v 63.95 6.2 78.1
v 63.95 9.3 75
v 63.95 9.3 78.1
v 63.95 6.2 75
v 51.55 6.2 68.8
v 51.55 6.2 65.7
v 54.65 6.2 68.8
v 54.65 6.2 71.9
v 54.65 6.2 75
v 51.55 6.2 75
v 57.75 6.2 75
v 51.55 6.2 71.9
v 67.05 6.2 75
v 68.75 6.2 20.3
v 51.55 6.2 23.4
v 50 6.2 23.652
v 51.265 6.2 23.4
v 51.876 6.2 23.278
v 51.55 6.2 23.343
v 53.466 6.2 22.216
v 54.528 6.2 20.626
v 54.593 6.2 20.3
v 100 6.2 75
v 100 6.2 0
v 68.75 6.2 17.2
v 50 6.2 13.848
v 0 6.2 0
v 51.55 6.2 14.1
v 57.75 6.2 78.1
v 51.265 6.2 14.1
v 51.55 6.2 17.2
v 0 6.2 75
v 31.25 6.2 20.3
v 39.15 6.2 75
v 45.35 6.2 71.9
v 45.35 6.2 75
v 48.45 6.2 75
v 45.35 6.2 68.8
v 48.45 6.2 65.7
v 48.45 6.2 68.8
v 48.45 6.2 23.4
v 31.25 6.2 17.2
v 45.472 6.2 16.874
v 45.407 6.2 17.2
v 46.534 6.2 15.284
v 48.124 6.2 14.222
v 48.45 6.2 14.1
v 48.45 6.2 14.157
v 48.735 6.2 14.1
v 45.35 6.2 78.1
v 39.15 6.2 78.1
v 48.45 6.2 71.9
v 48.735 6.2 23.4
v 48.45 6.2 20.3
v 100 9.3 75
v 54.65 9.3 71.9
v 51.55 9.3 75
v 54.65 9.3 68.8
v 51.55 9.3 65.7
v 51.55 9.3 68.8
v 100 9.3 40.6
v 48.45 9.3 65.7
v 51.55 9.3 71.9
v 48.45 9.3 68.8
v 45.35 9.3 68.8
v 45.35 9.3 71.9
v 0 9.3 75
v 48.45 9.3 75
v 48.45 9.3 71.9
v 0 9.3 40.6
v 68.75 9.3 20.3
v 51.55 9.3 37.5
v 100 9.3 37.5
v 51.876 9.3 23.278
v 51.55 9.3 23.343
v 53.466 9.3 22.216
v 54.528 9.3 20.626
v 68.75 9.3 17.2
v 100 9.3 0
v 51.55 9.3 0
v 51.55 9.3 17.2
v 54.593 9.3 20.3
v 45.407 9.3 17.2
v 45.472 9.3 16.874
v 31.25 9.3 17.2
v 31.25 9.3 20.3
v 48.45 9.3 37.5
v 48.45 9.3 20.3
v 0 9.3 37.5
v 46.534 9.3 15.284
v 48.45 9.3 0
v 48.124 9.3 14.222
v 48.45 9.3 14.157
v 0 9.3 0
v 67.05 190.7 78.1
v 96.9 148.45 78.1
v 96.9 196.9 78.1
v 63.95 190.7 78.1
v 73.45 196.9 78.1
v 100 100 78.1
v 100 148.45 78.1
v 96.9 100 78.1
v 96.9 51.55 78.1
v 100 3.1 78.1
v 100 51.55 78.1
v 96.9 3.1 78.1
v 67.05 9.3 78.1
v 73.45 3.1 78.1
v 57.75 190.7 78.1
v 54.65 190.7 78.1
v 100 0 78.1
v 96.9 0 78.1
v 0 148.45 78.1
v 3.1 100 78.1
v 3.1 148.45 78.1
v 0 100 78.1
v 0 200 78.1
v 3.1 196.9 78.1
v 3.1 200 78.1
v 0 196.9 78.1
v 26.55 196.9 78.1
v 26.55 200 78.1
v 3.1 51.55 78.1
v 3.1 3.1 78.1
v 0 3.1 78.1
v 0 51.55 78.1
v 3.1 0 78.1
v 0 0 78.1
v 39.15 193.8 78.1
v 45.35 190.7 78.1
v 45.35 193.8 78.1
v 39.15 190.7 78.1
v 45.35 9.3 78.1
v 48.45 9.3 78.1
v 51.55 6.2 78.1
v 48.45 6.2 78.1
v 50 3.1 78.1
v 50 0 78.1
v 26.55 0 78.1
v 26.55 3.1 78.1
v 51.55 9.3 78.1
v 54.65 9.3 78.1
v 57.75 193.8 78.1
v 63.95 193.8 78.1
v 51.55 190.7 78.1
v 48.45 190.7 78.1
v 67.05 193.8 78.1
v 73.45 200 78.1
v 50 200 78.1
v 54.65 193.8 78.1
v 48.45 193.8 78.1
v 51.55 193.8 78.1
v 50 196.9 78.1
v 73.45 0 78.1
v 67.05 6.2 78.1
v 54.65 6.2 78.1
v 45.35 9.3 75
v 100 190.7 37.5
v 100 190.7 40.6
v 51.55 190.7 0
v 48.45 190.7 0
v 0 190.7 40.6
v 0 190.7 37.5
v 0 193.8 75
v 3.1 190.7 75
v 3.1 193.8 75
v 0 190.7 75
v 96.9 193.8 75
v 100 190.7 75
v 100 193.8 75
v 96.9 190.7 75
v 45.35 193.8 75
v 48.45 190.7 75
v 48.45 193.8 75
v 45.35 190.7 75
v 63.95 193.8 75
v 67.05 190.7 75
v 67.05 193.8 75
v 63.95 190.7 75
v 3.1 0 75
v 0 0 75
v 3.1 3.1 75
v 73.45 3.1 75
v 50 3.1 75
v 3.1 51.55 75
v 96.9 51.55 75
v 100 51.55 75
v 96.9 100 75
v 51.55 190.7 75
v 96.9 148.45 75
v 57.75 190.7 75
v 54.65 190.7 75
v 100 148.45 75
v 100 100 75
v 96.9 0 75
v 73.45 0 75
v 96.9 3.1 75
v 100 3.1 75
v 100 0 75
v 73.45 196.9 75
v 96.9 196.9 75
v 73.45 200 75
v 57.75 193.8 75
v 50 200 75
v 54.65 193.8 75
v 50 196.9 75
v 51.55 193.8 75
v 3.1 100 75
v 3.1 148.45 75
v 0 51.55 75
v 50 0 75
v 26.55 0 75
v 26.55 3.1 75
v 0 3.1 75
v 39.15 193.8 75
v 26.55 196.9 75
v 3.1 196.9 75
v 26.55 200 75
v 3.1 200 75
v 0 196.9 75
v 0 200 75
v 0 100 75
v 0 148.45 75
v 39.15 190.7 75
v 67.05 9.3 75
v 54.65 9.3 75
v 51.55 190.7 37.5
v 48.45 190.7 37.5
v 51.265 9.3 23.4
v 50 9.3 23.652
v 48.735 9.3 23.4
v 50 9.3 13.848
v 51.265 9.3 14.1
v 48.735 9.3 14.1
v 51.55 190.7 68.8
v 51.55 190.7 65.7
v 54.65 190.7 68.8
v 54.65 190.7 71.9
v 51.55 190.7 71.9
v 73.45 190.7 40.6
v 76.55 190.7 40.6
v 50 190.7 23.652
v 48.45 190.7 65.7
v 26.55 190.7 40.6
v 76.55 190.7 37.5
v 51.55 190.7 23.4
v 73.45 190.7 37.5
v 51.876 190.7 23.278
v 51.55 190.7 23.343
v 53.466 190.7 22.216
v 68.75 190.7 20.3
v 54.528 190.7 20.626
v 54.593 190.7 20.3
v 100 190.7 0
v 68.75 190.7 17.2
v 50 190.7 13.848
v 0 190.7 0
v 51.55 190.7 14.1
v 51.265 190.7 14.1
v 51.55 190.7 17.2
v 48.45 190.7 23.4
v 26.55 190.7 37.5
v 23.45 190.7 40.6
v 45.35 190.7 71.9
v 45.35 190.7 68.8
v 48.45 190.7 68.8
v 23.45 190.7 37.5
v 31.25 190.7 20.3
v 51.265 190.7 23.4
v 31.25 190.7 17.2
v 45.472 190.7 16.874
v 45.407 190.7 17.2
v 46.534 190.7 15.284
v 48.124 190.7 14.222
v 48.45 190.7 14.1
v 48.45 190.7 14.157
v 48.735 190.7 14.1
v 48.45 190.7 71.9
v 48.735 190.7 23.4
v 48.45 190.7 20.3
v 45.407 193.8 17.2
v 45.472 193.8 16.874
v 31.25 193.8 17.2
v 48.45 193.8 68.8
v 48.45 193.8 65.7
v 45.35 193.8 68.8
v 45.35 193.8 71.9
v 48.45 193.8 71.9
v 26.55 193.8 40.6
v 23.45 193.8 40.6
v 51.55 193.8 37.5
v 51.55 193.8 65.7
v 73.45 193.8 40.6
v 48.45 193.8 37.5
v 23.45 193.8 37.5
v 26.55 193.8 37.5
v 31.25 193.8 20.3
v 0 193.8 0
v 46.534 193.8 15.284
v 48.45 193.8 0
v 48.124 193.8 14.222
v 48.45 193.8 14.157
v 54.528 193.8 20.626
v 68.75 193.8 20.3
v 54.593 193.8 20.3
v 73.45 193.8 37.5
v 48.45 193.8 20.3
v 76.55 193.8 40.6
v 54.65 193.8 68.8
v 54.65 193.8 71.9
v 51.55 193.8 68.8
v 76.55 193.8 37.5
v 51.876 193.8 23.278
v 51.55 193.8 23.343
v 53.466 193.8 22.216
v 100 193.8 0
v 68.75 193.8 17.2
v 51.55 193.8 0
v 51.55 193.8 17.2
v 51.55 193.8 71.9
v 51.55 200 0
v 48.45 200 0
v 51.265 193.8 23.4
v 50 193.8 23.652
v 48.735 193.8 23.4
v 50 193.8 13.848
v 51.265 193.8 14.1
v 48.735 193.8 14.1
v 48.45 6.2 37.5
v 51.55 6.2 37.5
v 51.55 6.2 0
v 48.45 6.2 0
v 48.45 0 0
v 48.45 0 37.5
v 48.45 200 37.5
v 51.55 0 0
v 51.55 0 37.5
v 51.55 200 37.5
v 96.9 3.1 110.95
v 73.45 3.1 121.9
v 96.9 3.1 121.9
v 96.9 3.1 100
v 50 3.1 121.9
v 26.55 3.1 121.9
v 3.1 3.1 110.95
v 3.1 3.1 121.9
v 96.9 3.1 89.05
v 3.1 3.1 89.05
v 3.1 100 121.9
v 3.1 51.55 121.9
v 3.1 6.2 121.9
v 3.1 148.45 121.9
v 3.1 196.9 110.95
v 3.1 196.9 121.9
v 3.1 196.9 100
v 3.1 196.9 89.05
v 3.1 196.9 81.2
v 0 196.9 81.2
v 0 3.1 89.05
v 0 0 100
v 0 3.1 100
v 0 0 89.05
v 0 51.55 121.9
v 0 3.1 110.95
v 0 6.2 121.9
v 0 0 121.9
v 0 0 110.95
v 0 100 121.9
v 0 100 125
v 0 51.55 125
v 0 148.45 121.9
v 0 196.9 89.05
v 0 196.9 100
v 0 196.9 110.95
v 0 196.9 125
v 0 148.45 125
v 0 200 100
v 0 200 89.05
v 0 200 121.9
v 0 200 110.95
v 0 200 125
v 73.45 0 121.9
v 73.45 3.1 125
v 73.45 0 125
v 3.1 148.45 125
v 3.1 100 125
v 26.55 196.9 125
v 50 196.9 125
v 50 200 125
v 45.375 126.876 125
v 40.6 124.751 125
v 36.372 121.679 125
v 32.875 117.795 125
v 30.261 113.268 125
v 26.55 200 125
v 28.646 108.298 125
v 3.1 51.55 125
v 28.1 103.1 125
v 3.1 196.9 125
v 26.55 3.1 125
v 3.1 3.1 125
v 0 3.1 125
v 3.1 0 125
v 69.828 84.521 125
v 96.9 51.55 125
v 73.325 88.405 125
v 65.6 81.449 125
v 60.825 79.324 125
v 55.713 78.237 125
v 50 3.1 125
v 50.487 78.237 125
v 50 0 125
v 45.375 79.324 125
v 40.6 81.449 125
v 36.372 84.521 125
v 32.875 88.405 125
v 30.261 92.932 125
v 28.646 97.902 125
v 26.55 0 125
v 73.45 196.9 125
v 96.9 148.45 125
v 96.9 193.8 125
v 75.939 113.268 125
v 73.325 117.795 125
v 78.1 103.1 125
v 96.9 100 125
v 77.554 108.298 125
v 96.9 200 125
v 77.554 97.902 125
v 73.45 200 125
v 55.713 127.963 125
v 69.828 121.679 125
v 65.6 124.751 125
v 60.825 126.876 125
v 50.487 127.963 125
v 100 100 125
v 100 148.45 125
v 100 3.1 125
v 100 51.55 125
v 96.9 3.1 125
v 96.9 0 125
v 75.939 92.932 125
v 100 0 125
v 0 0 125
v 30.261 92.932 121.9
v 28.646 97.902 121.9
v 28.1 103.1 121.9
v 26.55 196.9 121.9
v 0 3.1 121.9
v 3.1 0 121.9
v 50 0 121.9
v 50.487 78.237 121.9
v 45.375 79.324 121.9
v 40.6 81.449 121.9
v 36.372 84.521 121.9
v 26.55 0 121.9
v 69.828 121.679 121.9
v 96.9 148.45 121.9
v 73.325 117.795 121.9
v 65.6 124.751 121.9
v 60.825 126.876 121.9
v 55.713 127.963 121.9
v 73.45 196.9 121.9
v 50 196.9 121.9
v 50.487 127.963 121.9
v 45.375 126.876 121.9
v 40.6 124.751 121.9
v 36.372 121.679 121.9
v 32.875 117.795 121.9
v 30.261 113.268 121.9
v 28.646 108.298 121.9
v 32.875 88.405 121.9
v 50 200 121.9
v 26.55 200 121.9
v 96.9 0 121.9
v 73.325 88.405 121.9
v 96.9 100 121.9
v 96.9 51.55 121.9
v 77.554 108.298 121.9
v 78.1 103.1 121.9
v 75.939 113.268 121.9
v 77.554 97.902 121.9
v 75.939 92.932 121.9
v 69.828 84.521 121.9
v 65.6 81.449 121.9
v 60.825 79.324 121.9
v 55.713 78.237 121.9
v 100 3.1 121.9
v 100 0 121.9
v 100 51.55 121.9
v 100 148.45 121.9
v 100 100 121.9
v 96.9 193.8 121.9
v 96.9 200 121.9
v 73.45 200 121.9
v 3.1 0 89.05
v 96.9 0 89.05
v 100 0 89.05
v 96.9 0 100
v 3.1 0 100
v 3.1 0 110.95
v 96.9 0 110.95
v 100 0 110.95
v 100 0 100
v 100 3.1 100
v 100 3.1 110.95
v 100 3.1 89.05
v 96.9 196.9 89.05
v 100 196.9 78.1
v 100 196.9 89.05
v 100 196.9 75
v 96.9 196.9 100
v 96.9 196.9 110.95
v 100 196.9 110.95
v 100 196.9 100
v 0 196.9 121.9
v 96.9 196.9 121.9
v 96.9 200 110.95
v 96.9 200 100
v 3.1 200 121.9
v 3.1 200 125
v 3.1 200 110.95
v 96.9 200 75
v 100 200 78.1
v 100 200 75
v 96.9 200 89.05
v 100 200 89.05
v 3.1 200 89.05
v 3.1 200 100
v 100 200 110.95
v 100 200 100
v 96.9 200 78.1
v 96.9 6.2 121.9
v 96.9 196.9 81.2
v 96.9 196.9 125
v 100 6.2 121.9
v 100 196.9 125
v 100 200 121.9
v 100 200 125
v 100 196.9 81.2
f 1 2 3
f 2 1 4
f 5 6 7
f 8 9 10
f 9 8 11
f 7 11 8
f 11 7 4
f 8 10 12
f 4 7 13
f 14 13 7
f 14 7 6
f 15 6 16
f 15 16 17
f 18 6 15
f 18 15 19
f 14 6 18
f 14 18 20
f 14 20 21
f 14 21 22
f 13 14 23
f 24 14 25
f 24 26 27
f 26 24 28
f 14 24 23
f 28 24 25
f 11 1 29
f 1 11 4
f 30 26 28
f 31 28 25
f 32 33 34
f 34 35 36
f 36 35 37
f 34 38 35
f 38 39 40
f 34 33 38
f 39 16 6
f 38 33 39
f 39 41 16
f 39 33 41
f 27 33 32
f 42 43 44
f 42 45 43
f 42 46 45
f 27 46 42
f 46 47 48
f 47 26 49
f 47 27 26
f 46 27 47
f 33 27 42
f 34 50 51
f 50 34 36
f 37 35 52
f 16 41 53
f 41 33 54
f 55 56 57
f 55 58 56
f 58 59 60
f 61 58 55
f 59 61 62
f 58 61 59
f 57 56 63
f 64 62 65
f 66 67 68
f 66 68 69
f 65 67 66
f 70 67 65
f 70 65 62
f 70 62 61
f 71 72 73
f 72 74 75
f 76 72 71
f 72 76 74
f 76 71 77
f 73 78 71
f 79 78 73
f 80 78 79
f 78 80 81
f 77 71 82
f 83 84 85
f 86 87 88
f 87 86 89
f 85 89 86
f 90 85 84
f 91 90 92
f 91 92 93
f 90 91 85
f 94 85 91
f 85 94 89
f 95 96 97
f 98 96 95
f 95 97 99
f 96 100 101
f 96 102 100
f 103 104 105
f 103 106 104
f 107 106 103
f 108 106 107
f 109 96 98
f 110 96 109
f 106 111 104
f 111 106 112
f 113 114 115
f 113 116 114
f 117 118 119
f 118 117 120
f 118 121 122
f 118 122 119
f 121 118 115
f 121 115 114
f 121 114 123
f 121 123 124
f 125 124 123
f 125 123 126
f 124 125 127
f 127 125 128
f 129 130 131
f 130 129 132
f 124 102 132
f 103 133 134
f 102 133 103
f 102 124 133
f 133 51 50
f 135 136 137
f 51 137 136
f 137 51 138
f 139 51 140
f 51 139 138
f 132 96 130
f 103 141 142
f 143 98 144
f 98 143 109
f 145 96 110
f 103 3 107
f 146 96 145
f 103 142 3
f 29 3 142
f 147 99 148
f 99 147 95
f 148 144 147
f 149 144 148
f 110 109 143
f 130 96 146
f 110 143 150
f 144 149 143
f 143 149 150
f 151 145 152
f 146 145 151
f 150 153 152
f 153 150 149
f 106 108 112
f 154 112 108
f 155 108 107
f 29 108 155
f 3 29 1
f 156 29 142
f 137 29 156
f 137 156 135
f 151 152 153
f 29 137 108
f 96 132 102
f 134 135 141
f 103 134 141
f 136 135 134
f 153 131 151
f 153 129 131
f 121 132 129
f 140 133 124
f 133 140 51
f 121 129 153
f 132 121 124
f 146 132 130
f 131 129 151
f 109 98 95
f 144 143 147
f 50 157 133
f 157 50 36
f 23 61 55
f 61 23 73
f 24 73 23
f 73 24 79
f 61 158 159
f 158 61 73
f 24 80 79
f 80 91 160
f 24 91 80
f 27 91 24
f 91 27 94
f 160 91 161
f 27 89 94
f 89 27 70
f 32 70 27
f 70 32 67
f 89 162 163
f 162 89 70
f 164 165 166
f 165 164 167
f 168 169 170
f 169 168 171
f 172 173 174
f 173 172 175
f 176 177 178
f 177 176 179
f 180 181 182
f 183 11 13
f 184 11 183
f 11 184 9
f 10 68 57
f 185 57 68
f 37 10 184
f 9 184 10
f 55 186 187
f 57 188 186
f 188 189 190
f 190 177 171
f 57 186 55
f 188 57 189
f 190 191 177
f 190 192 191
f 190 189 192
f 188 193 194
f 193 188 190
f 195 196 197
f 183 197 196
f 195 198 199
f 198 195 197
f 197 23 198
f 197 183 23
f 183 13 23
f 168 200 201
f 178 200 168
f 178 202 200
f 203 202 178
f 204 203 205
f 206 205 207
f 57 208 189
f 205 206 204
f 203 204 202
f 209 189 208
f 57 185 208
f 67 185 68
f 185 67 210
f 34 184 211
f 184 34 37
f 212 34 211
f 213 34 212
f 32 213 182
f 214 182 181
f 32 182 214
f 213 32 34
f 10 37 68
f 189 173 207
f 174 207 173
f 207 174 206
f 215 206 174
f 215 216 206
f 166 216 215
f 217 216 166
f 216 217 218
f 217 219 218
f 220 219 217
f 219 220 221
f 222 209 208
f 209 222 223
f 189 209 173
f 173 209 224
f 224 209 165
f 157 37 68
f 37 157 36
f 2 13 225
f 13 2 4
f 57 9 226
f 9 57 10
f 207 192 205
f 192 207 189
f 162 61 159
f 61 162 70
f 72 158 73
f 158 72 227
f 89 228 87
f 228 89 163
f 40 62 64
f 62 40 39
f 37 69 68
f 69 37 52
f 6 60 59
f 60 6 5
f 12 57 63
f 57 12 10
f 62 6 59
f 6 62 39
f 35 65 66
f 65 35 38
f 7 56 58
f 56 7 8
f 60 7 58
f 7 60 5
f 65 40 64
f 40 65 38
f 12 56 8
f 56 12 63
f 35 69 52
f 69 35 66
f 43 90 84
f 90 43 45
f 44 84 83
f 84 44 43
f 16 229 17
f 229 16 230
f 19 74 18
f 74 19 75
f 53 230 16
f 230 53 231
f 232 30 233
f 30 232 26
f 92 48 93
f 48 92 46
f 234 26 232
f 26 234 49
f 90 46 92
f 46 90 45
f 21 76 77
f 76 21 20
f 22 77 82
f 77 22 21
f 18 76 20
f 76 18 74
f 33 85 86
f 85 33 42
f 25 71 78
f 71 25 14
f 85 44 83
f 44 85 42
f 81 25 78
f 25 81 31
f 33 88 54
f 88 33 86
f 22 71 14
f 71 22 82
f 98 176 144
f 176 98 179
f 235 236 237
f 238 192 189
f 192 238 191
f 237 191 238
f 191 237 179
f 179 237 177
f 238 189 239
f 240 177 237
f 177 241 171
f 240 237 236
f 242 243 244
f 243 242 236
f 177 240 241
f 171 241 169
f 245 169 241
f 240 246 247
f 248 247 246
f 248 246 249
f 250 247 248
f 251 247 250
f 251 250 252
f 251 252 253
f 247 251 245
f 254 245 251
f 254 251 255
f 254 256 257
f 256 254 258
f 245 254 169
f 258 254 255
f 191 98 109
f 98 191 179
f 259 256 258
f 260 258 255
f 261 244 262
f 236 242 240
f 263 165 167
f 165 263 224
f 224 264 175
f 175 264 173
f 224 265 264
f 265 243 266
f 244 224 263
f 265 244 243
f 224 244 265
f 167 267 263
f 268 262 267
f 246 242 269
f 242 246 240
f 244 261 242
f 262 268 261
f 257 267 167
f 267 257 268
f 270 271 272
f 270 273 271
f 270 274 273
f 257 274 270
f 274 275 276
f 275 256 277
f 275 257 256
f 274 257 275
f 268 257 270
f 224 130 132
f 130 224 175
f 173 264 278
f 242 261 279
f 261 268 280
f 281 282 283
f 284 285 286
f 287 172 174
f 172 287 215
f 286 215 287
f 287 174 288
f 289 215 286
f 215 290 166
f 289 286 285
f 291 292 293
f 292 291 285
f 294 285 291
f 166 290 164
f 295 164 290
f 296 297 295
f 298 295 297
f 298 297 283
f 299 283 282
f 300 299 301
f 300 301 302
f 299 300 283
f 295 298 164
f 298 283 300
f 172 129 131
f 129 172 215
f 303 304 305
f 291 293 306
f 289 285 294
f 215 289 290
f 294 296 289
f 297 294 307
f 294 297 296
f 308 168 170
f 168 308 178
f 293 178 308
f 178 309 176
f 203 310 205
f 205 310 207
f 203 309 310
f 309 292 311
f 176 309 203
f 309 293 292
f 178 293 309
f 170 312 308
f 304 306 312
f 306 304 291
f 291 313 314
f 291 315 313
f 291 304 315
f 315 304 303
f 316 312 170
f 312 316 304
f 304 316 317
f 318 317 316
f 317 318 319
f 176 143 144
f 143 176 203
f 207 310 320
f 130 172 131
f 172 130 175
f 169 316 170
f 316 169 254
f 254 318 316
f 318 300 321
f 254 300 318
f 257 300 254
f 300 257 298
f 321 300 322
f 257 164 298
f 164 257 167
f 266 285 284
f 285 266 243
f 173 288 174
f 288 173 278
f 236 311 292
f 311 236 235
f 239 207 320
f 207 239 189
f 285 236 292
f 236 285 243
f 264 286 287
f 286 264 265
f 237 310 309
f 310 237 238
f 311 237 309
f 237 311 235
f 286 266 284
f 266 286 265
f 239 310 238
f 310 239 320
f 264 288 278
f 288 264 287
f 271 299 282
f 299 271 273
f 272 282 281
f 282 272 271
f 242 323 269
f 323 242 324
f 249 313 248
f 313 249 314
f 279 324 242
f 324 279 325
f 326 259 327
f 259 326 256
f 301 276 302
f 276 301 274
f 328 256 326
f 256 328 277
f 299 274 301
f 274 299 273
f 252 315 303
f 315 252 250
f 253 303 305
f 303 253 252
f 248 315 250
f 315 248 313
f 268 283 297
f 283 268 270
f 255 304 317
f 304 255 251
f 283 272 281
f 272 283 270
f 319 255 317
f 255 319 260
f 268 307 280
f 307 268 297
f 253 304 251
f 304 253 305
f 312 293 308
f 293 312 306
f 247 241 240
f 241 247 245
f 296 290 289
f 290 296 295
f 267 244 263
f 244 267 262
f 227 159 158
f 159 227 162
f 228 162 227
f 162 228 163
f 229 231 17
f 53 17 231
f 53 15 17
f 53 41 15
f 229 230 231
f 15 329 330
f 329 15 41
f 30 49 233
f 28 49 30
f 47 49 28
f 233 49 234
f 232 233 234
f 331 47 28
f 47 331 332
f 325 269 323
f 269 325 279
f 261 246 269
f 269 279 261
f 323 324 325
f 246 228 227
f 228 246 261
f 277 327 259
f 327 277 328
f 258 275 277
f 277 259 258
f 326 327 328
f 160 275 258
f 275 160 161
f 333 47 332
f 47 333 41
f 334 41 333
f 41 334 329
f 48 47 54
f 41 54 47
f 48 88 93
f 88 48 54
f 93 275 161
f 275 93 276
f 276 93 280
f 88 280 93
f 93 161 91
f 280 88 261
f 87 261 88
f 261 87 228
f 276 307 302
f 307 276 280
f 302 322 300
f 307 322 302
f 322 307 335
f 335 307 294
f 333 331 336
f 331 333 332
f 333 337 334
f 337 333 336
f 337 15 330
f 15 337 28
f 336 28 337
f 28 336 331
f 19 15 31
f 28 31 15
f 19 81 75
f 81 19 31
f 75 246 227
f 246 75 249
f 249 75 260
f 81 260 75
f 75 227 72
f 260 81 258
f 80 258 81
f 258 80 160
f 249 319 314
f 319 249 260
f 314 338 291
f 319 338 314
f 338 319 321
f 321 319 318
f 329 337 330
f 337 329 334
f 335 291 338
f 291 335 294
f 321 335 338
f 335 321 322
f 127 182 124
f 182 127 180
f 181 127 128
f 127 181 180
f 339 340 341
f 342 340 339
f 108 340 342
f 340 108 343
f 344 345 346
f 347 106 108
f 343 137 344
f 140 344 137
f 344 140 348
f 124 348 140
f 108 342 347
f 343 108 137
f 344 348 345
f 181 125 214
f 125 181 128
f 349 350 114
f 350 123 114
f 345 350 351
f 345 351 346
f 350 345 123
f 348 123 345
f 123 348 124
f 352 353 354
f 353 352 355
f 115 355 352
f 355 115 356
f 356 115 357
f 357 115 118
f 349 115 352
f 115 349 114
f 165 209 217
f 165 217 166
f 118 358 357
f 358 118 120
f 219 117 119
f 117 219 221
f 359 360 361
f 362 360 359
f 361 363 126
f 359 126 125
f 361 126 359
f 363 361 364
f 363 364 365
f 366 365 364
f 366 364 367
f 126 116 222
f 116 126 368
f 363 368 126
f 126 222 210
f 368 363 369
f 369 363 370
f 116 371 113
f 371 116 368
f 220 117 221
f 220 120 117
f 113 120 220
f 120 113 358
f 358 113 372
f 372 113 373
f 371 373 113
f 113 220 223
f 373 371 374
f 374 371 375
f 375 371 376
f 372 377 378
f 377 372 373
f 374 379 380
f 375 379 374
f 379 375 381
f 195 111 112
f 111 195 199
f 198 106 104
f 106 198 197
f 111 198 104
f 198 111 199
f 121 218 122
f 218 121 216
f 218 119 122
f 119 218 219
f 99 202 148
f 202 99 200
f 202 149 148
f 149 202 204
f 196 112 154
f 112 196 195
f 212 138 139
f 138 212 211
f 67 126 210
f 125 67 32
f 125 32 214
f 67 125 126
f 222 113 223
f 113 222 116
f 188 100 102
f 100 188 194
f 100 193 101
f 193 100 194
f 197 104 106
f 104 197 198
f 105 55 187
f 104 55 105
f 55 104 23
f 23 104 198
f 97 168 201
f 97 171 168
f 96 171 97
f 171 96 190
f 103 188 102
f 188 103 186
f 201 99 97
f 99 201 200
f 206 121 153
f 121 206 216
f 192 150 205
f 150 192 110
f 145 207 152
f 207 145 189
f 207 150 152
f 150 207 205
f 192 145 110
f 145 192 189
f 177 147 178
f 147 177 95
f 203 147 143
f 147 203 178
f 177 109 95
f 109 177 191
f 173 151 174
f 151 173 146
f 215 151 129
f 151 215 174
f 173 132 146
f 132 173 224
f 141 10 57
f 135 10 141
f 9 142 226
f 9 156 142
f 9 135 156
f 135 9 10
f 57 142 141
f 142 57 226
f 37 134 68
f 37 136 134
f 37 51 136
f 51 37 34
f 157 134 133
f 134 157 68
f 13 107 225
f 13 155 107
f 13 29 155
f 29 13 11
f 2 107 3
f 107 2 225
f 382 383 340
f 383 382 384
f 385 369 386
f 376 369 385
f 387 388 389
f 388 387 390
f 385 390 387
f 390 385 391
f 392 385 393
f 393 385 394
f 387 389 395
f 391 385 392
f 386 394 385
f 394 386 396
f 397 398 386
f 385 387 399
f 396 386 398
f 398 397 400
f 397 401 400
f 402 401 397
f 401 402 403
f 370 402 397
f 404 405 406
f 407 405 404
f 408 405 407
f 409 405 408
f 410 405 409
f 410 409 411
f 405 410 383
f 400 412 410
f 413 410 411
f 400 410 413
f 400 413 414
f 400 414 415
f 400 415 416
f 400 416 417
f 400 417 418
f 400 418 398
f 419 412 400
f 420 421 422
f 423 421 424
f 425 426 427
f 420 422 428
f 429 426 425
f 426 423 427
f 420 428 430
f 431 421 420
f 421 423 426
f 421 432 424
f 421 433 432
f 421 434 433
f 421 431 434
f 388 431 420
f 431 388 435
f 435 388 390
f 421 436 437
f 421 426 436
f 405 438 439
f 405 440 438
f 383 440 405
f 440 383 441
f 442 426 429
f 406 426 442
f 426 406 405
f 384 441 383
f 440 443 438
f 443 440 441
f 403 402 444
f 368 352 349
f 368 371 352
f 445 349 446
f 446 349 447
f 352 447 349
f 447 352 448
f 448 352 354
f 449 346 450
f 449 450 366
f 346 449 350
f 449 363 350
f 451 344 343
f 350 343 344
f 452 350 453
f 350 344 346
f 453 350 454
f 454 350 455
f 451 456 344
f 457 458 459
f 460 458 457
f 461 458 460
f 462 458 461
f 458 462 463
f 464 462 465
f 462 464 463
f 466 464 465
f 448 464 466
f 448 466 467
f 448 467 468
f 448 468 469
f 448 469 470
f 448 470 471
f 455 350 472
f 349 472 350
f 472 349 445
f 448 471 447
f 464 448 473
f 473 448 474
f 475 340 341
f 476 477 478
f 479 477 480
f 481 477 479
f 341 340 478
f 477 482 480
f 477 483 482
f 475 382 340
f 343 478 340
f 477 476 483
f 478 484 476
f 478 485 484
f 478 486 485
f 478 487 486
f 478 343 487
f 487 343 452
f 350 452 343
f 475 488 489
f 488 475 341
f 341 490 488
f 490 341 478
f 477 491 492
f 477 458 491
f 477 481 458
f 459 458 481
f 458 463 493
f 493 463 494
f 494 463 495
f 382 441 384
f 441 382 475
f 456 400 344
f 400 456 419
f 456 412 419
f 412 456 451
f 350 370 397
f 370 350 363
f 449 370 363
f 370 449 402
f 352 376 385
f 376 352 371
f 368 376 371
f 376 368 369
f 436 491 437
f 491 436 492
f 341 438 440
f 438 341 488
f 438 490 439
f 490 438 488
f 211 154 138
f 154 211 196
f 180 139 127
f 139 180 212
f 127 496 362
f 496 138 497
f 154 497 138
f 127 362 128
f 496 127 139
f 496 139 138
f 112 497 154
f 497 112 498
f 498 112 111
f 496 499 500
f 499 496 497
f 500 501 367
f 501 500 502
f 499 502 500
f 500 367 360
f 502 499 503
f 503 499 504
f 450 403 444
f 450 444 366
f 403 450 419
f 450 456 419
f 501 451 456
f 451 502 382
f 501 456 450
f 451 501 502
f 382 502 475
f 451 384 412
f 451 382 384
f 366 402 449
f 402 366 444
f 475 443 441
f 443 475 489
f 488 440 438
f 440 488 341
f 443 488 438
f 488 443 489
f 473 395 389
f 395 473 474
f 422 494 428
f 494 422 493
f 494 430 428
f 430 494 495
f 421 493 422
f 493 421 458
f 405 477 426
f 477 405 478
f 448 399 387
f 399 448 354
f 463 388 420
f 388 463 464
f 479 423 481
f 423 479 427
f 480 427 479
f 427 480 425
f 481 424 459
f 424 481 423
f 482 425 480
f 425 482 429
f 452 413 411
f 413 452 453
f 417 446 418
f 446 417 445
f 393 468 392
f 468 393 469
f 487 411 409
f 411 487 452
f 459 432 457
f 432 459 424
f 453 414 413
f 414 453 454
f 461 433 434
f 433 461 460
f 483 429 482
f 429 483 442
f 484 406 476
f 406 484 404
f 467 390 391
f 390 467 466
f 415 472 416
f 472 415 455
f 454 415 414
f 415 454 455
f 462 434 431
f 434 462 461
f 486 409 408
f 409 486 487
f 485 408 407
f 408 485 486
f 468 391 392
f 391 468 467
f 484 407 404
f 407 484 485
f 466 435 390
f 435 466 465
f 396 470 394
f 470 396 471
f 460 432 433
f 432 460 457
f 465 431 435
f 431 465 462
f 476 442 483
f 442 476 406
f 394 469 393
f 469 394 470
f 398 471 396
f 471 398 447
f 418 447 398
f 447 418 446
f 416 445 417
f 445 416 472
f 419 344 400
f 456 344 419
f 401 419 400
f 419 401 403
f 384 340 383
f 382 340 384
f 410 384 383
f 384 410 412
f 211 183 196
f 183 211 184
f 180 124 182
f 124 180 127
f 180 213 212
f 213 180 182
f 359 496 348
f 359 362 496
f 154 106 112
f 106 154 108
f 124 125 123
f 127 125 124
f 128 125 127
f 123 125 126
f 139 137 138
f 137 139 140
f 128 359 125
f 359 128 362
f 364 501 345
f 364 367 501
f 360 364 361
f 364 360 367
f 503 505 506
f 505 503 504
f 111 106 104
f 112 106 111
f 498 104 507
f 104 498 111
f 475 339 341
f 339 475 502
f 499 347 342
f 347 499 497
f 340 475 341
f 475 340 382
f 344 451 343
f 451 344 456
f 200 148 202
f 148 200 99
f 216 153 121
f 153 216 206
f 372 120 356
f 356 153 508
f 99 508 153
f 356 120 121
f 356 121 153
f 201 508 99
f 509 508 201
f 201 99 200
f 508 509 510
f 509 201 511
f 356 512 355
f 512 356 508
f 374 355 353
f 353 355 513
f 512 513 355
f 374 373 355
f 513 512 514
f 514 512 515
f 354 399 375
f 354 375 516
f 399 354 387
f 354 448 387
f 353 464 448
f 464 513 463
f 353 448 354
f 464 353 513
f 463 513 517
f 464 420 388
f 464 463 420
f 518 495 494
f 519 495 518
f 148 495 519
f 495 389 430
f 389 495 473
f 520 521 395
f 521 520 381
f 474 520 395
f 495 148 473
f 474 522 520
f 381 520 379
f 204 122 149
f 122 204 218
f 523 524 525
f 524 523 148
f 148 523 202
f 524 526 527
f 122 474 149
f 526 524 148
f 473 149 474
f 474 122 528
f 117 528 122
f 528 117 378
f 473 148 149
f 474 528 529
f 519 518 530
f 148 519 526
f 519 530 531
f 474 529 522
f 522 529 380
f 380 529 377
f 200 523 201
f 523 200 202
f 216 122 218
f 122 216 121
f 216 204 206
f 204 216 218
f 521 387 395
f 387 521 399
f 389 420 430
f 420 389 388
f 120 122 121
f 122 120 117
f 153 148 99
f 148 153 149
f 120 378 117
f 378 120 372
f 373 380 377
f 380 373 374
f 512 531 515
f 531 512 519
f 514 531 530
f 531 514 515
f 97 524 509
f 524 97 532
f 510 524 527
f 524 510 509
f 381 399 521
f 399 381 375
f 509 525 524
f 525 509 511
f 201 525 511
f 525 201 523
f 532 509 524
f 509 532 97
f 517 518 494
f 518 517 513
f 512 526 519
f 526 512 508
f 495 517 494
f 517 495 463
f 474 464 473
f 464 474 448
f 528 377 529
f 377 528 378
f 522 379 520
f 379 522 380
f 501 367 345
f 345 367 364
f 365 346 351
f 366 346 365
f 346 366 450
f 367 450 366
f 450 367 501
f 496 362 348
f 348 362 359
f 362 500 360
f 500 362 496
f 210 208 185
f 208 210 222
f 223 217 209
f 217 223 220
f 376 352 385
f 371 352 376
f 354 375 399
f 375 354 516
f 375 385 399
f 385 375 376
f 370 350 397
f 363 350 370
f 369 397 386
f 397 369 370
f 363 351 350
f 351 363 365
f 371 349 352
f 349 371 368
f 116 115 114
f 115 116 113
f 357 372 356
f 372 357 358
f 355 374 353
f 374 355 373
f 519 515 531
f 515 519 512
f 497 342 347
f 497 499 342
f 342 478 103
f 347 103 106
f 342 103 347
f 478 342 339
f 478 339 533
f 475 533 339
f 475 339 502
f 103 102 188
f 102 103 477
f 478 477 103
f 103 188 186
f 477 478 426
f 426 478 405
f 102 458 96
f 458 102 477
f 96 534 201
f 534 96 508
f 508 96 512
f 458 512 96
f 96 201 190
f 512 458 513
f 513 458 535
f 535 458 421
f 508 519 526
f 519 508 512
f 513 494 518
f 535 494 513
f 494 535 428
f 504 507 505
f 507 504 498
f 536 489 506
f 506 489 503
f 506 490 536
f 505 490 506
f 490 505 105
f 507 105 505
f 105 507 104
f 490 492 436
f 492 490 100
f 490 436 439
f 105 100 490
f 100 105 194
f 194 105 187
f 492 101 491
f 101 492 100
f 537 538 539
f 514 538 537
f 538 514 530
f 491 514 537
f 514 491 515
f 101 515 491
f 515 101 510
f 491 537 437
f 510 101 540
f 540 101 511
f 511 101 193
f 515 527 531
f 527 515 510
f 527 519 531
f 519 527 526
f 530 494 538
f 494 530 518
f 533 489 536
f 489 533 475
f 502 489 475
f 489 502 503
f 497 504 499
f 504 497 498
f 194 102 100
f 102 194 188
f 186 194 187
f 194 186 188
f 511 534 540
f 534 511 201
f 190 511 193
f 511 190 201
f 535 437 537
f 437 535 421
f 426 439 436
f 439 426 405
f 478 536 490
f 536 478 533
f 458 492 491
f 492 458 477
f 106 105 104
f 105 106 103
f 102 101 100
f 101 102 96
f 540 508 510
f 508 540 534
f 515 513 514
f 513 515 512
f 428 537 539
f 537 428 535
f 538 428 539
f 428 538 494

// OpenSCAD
include <lasercut.scad>; 

thickness = 3.1;
x = 100;
y = 200;
z =  50;
height = 75;


module support()
{
    lasercutoutSquare(thickness=thickness, x=x, y=height,
        simple_tab_holes=[
            [MID, x*.25-thickness/2, height/2], 
            [MID, x*.75-thickness/2, height/2]
            ],
        captive_nuts=[
            [UP, x/2, height] 
            ],
        twist_holes=[
            [RIGHT, x/2, height/4, height/2]
            ]
    );   
}

module stut()
{
    lasercutoutSquare(thickness=thickness, x=x, y=y-thickness*6,  
        simple_tabs=[
            [UP, x*.75, y-thickness*6], [UP, x*.25, y-thickness*6],
            [DOWN, x*.75, 0], [DOWN, x*.25, 0] 
            ]
        );   
}

module beam()
{
    rotate([0,90.0])
    lasercutoutSquare(thickness=thickness, x=height/2, y=y,
        twist_connect=[
            [RIGHT,height/4,thickness*2],
            [RIGHT,height/4,y-thickness*3]
            ]
        );   
}


module box()
{
    circles_remove_a = [
        [],
        [[x/4, x/2, y/2]]
    ];
    captive_nut_holes_a = [
        [[UP, x/2, y-2*thickness,], [DOWN, x/2, 0,], ]
    ];
    lasercutoutBox(thickness = thickness, x=x, y=y, z=z, sides=6, captive_nut_holes_a = captive_nut_holes_a, circles_remove_a=circles_remove_a );
}


translate([0,thickness*3,0]) rotate([90,0,0]) support();
translate([0,y-thickness*2,0]) rotate([90,0,0]) support();
translate([0,thickness*3,height/2]) stut();
translate([x/2-thickness/2,0,height/2]) beam();
translate([0,0,height]) box();
